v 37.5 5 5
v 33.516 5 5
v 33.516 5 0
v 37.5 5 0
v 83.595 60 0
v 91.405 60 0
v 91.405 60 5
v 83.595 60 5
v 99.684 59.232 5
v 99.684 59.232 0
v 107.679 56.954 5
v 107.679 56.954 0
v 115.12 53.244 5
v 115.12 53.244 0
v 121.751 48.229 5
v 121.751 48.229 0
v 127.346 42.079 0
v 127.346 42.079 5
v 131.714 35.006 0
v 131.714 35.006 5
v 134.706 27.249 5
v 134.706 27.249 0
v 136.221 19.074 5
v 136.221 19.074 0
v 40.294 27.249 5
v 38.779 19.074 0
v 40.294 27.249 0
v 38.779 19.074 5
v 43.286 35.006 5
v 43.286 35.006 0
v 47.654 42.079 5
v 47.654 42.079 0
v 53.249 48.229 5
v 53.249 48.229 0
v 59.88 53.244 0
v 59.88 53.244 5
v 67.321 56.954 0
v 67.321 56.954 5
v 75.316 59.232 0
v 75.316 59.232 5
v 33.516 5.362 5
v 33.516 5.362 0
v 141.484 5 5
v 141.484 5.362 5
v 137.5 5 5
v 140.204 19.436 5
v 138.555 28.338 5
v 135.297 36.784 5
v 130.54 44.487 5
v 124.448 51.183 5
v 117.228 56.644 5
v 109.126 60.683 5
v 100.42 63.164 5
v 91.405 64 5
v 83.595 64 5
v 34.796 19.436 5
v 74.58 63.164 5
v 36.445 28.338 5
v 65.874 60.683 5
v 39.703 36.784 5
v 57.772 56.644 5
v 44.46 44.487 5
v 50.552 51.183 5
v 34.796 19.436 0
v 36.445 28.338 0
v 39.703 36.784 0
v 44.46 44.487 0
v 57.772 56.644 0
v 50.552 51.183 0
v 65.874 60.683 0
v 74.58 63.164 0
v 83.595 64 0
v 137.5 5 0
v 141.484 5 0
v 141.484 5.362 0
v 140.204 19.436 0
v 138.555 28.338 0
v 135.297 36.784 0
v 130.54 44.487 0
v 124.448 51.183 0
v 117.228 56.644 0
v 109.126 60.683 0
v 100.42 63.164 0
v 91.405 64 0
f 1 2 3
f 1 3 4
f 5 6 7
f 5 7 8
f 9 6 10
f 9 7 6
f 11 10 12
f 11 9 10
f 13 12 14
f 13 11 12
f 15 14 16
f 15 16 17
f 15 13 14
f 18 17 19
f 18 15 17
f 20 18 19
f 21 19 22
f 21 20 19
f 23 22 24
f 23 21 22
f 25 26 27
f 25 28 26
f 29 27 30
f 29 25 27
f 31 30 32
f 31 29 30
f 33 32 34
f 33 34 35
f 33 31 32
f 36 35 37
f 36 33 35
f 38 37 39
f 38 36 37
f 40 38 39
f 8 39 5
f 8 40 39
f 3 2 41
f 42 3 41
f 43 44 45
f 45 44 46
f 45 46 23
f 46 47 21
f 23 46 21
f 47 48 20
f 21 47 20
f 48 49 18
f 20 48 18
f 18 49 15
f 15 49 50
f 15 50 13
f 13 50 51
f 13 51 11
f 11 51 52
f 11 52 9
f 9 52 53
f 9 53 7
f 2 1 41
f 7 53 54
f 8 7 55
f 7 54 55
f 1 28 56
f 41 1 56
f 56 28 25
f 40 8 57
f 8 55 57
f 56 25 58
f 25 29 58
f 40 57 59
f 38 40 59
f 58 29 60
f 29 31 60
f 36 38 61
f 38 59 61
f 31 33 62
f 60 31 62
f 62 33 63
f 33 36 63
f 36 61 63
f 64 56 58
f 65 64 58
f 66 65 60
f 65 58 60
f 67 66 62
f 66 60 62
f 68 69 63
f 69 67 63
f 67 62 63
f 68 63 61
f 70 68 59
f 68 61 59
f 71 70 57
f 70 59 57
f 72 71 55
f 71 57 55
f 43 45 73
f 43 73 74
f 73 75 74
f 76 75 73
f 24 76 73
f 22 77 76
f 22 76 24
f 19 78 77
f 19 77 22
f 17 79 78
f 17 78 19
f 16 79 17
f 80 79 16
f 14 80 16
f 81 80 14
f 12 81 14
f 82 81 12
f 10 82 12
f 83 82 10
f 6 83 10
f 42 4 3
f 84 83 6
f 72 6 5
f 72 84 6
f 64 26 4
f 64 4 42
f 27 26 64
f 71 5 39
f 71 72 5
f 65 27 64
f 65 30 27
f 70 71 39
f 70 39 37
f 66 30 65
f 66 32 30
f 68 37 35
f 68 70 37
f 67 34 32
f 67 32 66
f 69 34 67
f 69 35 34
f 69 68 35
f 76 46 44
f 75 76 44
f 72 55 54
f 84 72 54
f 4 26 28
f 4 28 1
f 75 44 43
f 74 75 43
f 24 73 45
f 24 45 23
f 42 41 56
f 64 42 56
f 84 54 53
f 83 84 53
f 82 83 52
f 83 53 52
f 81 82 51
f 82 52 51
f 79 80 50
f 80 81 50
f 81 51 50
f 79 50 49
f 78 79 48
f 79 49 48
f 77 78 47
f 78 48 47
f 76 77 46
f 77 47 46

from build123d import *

# Parameters (mm, degrees)
EXTRUDE_1_DEPTH      = 5
SKETCH_3_W           = 25
SKETCH_3_H           = 3
SKETCH_3_W_2         = 27.5
CUT_EXTRUDE_1_DEPTH  = 396.82192966
SKETCH_2_R           = 1
CUT_EXTRUDE_2_DEPTH  = 396.82192966
SKETCH_4_R           = 1
CUT_EXTRUDE_3_DEPTH  = 396.82192966
SKETCH_5_W           = 3
SKETCH_5_H           = 20
CUT_EXTRUDE_4_DEPTH  = 396.82192966
SKETCH_6_W           = 52.963954937
SKETCH_6_H           = 5
SKETCH_6_W_2         = 50.247879271
CUT_EXTRUDE_5_DEPTH  = 396.82192966
SKETCH_7_W           = 24.499878537
SKETCH_7_H           = 5
SKETCH_7_W_2         = 25.63433041
SKETCH_7_W_3         = 30.65568147
SKETCH_7_W_4         = 13.75
CUT_EXTRUDE_6_DEPTH  = 396.82192966
CUT_EXTRUDE_10_DEPTH = 396.82192966
SKETCH_12_W          = 10
SKETCH_12_H          = 114.036005351
CUT_EXTRUDE_11_DEPTH = 396.82192966
SKETCH_13_W          = 5
SKETCH_13_H          = 15
EXTRUDE_2_DEPTH      = 3
CUT_EXTRUDE_12_DEPTH = 396.82192966
FILLET_1_R           = 45
CUT_EXTRUDE_13_DEPTH = 396.82192966


with BuildPart() as part:
    # 草图1 → 凸台-拉伸1 (new body)
    with BuildSketch(Plane.XY):
        Polygon((0, 0), (0, 85), (110, 105), (125, 175), (355, 175), (355, 0), (317.5, 0), (317.5, 5), (312.5, 60), (222.5, 60), (217.5, 5), (217.5, 0), (137.5, 0), (137.5, 5), (132.5, 60), (42.5, 60), (37.5, 5), (37.5, 0), align=None)
    extrude(amount=EXTRUDE_1_DEPTH)

    # 草图3 → 切除-拉伸1 (cut, through all)
    with BuildSketch(Plane.XY.offset(5)):
        with Locations((180, 173.5)):
            Rectangle(SKETCH_3_W, SKETCH_3_H)
        with Locations((341.25, 173.5)):
            Rectangle(SKETCH_3_W_2, SKETCH_3_H)
        with Locations((220, 173.5)):
            Rectangle(SKETCH_3_W, SKETCH_3_H)
        with Locations((260, 173.5)):
            Rectangle(SKETCH_3_W, SKETCH_3_H)
        with Locations((300, 173.5)):
            Rectangle(SKETCH_3_W, SKETCH_3_H)
        Polygon((152.5, 175), (152.5, 172), (124.357142857, 172), (125, 175), align=None)
    extrude(amount=-CUT_EXTRUDE_1_DEPTH, mode=Mode.SUBTRACT)

    # 草图2 → 切除-拉伸2 (cut, through all)
    with BuildSketch(Plane.XY.offset(5)):
        with Locations((200, 173)):
            Circle(SKETCH_2_R)
        with Locations((240, 173)):
            Circle(SKETCH_2_R)
        with Locations((280, 173)):
            Circle(SKETCH_2_R)
        with Locations((320, 173)):
            Circle(SKETCH_2_R)
        with Locations((160, 173)):
            Circle(SKETCH_2_R)
    extrude(amount=-CUT_EXTRUDE_2_DEPTH, mode=Mode.SUBTRACT)

    # 草图4 → 切除-拉伸3 (cut, through all)
    with BuildSketch(Plane.XY.offset(5)):
        with Locations((353, 162)):
            Circle(SKETCH_4_R)
        with Locations((353, 122)):
            Circle(SKETCH_4_R)
        with Locations((353, 82)):
            Circle(SKETCH_4_R)
        with Locations((353, 42)):
            Circle(SKETCH_4_R)
    extrude(amount=-CUT_EXTRUDE_3_DEPTH, mode=Mode.SUBTRACT)

    # 草图5 → 切除-拉伸4 (cut, through all)
    with BuildSketch(Plane.XY.offset(5)):
        with Locations((353.5, 142)):
            Rectangle(SKETCH_5_W, SKETCH_5_H)
        with Locations((353.5, 102)):
            Rectangle(SKETCH_5_W, SKETCH_5_H)
        with Locations((353.5, 62)):
            Rectangle(SKETCH_5_W, SKETCH_5_H)
        with Locations((353.5, 22)):
            Rectangle(SKETCH_5_W, SKETCH_5_H)
    extrude(amount=-CUT_EXTRUDE_4_DEPTH, mode=Mode.SUBTRACT)

    # 草图6 → 切除-拉伸5 (cut, through all)
    with BuildSketch(Plane.XY.offset(5)):
        with Locations((136.018022532, 2.5)):
            Rectangle(SKETCH_6_W, SKETCH_6_H)
        with Locations((217.623939635, 2.5)):
            Rectangle(SKETCH_6_W_2, SKETCH_6_H)
    extrude(amount=-CUT_EXTRUDE_5_DEPTH, mode=Mode.SUBTRACT)

    # 草图7 → 切除-拉伸6 (cut, through all)
    with BuildSketch(Plane.XY.offset(5)):
        with Locations((1.500060731, 2.5)):
            Rectangle(SKETCH_7_W, SKETCH_7_H)
        with Locations((36.567165205, 2.5)):
            Rectangle(SKETCH_7_W_2, SKETCH_7_H)
        with Locations((315.922159265, 2.5)):
            Rectangle(SKETCH_7_W_3, SKETCH_7_H)
        with Locations((348.125, 2.5)):
            Rectangle(SKETCH_7_W_4, SKETCH_7_H)
    extrude(amount=-CUT_EXTRUDE_6_DEPTH, mode=Mode.SUBTRACT)

    # 草图11 → 切除-拉伸10 (cut, through all)
    with BuildSketch(Plane.XY.offset(5)):
        Polygon((114.275152951, 110.632892707), (111.341745709, 111.261479973), (123.075374677, 166.018415161), (126.00878192, 165.389827895), align=None)
    extrude(amount=-CUT_EXTRUDE_10_DEPTH, mode=Mode.SUBTRACT)

    # 草图12 → 切除-拉伸11 (cut, through all)
    with BuildSketch(Plane.XY.offset(5)):
        with Locations((5, 77.018002676)):
            Rectangle(SKETCH_12_W, SKETCH_12_H)
    extrude(amount=-CUT_EXTRUDE_11_DEPTH, mode=Mode.SUBTRACT)

    # 草图13 → 凸台-拉伸2 (add)
    with BuildSketch(Plane.XY.offset(5)):
        with Locations((7.5, 37.5)):
            Rectangle(SKETCH_13_W, SKETCH_13_H)
        with Locations((7.5, 67.5)):
            Rectangle(SKETCH_13_W, SKETCH_13_H)
    extrude(amount=-EXTRUDE_2_DEPTH)

    # 草图15 → 切除-拉伸12 (cut, through all)
    with BuildSketch(Plane.XY.offset(5)):
        Polygon((35.491174943, 86.370968223), (34.596747752, 91.290317773), (19.838699101, 88.6070362), (20.733126292, 83.68768665), align=None)
        Polygon((54.274145954, 94.868026537), (55.168573145, 89.948676987), (69.926621797, 92.63195856), (69.032194606, 97.55130811), align=None)
        Polygon((88.709592808, 101.129016874), (89.604019999, 96.209667324), (104.36206865, 98.892948897), (103.467641459, 103.812298447), align=None)
    extrude(amount=-CUT_EXTRUDE_12_DEPTH, mode=Mode.SUBTRACT)

    # 圆角1
    fillet_1_edges = [part.edges().sort_by_distance(p)[0] for p in [
        (312.5, 60, 2.5),
        (222.5, 60, 2.5),
        (132.5, 60, 2.5),
        (42.5, 60, 2.5),
    ]]
    fillet(fillet_1_edges, radius=FILLET_1_R)

    # 草图16 → 切除-拉伸13 (cut, through all)
    with BuildSketch(Plane.XY.offset(5)):
        with BuildLine():
            Line((33.516427174, 5), (33.516427174, 5.362142984))
            Line((33.516427174, 5.362142984), (34.79589159, 19.436251556))
            ThreePointArc((34.79589159, 19.436251556), (50.552082583, 51.182705304), (83.594658707, 64))
            Line((83.594658707, 64), (91.405341293, 64))
            ThreePointArc((91.405341293, 64), (124.447917417, 51.182705304), (140.20410841, 19.436251556))
            Line((140.20410841, 19.436251556), (141.483572826, 5.362142984))
            Line((141.483572826, 5.362142984), (141.483572826, 5))
            Line((141.483572826, 5), (162.5, 0))
            Line((162.5, 0), (192.5, 0))
            Line((192.5, 0), (217.5, 5))
            Line((217.5, 5), (317.5, 5))
            Line((317.5, 5), (331.25, 0))
            Line((331.25, 0), (341.25, 0))
            Line((341.25, 0), (355, 5))
            Line((355, 5), (355, 172))
            Line((355, 172), (327.5, 175))
            Line((327.5, 175), (152.5, 175))
            Line((152.5, 175), (124.357142857, 172))
            Line((124.357142857, 172), (88.709592808, 101.129016874))
            Line((88.709592808, 101.129016874), (10, 86.818181818))
            Line((10, 86.818181818), (5, 75))
            Line((5, 75), (0, 20))
            Line((0, 20), (0, 5))
            Line((0, 5), (13.75, 0))
            Line((13.75, 0), (23.75, 0))
            Line((23.75, 0), (33.516427174, 5))
        make_face()
    extrude(amount=-CUT_EXTRUDE_13_DEPTH, mode=Mode.SUBTRACT)


solid = part.part
